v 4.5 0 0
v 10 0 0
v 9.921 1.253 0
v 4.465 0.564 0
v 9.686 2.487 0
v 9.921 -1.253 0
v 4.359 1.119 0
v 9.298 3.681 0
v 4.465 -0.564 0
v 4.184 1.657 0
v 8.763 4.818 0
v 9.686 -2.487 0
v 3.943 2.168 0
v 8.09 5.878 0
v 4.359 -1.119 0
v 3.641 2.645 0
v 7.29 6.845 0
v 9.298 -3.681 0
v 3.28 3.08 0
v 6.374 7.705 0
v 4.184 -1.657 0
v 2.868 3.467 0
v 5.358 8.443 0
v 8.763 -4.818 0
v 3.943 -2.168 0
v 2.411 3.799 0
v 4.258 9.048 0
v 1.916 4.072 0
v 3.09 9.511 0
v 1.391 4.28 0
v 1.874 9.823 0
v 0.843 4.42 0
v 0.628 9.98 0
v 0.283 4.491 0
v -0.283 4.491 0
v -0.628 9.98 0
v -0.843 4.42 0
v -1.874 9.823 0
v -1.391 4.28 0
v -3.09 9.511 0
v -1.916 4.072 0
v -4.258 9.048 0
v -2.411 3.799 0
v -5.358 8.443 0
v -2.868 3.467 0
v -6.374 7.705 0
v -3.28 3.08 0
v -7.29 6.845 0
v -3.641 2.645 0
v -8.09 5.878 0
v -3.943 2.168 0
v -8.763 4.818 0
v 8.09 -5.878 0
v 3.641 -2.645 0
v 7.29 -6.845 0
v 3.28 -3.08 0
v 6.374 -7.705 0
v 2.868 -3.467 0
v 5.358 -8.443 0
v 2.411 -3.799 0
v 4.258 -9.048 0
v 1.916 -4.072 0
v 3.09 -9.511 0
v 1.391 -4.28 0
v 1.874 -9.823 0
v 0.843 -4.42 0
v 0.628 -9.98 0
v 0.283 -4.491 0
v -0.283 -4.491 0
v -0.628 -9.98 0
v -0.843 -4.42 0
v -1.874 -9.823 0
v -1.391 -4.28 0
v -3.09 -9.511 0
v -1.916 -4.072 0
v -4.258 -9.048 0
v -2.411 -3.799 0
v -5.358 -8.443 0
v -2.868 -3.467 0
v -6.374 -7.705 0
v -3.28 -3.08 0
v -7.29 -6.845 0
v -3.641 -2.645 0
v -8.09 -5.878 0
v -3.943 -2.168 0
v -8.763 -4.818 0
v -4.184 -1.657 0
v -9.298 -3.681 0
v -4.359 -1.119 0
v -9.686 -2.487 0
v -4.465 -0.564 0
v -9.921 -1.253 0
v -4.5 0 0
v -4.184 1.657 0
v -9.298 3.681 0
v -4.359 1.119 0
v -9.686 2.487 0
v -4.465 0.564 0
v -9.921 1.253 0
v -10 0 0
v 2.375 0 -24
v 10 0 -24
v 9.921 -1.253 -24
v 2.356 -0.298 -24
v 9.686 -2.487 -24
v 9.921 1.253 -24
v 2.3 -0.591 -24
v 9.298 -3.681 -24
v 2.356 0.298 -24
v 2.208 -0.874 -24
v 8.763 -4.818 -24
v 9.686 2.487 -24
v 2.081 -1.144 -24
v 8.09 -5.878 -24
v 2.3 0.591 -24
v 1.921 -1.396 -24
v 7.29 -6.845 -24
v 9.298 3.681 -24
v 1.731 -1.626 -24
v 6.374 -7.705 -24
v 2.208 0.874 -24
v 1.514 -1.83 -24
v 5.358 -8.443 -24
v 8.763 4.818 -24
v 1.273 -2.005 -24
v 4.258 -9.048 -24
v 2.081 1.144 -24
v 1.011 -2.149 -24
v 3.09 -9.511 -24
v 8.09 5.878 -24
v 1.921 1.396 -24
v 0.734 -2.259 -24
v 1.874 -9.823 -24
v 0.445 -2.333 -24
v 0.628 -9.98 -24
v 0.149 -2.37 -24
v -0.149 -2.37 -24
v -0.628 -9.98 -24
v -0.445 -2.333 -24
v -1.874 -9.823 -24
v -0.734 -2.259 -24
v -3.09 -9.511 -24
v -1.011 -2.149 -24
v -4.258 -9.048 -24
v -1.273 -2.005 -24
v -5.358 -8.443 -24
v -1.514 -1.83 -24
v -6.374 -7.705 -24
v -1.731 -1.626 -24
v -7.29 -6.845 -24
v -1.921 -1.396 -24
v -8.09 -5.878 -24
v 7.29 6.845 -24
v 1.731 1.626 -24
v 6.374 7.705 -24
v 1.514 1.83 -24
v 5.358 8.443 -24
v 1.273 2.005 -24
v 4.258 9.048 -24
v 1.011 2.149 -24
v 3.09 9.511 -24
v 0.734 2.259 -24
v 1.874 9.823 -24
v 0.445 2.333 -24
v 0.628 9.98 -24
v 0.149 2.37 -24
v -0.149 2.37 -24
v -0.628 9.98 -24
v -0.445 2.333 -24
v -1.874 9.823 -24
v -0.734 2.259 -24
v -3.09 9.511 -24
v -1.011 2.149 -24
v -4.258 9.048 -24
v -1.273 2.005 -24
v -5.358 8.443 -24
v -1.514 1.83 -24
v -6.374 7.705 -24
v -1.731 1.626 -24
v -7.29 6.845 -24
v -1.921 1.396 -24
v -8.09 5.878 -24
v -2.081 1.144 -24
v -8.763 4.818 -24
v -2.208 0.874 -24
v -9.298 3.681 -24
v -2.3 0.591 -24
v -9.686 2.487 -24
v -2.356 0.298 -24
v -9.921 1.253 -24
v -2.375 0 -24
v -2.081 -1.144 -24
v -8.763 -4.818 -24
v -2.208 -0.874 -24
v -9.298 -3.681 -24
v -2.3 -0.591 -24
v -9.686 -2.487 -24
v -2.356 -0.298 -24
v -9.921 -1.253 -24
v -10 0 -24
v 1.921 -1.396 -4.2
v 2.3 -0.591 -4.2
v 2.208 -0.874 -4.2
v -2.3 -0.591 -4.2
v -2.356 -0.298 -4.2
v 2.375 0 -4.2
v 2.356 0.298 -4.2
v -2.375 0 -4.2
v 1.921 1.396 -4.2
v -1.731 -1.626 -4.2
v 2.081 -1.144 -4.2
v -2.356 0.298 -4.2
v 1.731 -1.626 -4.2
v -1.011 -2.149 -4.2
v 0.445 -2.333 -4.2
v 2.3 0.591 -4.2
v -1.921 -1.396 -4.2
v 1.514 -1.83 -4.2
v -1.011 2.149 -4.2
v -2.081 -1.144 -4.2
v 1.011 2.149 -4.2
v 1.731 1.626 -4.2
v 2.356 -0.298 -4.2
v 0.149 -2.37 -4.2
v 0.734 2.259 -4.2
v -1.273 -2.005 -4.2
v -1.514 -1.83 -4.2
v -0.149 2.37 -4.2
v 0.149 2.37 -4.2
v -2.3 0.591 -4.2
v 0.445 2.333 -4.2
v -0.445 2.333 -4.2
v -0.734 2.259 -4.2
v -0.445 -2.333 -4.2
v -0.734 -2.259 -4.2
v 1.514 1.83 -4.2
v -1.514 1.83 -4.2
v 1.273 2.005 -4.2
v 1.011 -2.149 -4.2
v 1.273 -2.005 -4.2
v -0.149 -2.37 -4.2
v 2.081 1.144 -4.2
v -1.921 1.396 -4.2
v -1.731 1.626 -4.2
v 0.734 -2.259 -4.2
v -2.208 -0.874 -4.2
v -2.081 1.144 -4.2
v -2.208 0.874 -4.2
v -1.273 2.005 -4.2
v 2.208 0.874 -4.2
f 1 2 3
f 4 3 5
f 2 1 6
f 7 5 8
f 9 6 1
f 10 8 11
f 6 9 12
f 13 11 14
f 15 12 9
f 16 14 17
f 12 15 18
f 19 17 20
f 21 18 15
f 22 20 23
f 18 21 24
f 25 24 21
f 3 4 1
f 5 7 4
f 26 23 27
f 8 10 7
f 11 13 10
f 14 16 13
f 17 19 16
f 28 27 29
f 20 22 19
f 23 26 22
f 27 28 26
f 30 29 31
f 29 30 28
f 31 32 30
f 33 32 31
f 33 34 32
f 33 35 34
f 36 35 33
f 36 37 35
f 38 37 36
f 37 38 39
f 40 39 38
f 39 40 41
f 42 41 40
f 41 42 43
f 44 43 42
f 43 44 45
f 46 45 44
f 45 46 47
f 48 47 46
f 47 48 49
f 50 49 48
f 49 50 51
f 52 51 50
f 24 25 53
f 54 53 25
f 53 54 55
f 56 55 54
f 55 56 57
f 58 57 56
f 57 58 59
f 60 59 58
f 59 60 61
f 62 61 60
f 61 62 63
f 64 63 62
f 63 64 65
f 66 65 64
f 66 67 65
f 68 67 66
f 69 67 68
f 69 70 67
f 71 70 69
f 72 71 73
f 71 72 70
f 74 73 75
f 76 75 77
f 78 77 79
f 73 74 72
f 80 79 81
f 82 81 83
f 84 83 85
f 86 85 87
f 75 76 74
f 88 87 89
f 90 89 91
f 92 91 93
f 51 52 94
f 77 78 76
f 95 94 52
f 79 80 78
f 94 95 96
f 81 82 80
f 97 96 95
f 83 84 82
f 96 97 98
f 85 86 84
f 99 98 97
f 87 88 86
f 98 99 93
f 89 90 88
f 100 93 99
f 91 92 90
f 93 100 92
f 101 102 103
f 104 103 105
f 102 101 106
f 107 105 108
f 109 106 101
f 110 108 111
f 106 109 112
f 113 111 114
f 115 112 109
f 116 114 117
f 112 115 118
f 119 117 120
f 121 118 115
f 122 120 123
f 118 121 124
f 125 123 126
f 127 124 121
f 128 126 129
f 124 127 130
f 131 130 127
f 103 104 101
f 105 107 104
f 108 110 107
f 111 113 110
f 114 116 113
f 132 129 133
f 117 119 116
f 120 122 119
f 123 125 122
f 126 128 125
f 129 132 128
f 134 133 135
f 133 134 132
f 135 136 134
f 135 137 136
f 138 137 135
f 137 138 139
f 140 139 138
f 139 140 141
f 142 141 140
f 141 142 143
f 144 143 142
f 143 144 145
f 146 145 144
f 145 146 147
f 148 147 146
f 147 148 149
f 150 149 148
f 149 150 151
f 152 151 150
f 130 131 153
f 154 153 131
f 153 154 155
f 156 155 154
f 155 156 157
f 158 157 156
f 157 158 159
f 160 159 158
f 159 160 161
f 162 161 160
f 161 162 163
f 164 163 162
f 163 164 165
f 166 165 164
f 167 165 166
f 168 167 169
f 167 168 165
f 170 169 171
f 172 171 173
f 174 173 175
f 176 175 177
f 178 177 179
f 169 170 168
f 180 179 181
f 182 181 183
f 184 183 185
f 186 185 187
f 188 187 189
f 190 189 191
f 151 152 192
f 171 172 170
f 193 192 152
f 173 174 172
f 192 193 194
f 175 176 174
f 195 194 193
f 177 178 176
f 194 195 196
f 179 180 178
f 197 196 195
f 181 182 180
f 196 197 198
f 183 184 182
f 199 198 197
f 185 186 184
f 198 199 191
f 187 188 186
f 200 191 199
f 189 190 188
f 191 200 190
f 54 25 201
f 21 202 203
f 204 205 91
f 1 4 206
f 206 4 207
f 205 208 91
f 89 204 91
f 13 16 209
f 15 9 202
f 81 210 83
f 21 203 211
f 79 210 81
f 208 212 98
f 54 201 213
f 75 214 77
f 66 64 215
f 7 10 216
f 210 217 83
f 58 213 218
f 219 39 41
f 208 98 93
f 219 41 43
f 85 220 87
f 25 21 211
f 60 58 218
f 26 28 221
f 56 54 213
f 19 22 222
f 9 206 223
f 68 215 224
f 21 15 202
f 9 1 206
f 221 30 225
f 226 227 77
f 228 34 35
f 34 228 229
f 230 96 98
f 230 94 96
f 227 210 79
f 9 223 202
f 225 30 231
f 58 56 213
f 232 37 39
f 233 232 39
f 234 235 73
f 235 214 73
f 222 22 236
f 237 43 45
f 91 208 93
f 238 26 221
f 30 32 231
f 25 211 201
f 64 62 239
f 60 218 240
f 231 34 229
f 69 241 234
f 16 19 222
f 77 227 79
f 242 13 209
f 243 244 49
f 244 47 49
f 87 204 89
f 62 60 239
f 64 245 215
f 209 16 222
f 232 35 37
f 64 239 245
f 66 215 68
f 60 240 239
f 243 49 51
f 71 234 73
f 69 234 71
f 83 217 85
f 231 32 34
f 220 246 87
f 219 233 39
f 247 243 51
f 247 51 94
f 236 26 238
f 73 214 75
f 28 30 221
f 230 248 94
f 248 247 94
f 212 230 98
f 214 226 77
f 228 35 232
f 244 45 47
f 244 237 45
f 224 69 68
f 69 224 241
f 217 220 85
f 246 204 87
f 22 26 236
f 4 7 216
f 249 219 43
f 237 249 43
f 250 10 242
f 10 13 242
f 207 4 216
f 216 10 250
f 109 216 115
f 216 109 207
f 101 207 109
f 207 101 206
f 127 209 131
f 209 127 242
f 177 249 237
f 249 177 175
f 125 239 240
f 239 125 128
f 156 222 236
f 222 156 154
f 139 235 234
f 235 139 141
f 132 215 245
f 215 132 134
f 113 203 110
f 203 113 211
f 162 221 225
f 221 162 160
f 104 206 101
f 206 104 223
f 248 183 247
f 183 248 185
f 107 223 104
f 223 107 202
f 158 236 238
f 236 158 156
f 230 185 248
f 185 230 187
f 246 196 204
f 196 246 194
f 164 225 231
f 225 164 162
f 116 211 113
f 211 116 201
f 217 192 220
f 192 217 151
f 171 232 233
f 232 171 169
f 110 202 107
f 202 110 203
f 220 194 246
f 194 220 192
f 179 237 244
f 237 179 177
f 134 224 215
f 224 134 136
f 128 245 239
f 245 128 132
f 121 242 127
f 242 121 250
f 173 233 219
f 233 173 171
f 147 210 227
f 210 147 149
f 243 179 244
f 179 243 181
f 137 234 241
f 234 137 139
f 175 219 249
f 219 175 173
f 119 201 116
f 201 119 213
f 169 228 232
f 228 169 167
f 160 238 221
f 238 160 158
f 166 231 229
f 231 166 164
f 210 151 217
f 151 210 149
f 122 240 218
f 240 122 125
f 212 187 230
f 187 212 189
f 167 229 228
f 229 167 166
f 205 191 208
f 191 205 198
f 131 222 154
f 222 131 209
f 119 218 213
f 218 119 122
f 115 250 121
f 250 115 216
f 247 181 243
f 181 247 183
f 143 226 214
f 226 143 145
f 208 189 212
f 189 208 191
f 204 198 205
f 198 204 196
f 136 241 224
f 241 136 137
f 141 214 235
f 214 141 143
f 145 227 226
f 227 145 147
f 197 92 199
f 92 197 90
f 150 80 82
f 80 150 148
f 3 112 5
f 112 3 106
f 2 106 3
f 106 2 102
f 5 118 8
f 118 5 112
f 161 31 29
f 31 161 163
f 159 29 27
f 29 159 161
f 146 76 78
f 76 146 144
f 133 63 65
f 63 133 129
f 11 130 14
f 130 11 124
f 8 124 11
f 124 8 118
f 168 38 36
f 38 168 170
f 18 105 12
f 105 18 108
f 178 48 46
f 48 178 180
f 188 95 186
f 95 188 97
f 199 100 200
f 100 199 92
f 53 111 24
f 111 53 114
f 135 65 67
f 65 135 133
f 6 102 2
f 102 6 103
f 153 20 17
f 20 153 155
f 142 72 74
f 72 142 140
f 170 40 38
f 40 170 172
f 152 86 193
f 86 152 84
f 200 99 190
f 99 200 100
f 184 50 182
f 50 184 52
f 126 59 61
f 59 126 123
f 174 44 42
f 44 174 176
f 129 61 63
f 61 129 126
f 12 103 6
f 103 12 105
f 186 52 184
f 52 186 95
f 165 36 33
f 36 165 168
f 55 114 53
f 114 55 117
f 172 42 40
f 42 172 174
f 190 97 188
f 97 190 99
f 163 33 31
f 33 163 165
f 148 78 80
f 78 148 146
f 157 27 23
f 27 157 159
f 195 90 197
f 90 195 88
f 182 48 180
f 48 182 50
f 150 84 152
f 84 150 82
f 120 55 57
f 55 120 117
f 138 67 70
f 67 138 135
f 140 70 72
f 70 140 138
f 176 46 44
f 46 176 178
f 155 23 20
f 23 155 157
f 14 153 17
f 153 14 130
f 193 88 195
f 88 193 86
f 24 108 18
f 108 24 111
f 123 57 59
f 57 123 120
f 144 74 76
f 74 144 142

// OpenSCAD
$fn = 50;


difference() {
	union() {
		translate(v = [0, 0, -24.0000000000]) {
			cylinder(h = 24, r = 10.0000000000);
		}
	}
	union() {
		translate(v = [0, 0, 0]) {
			rotate(a = [0, 0, 0]) {
				difference() {
					union() {
						#translate(v = [0, 0, -24.0000000000]) {
							cylinder(h = 24, r = 2.2500000000);
						}
						#translate(v = [0, 0, -4.2000000000]) {
							cylinder(h = 4.2000000000, r = 10.0000000000, r1 = 2.3750000000, r2 = 4.5000000000);
						}
						#translate(v = [0, 0, -24.0000000000]) {
							cylinder(h = 24, r = 2.3750000000);
						}
						#translate(v = [0, 0, -24.0000000000]) {
							cylinder(h = 24, r = 2.2500000000);
						}
					}
					union();
				}
			}
		}
	}
}
